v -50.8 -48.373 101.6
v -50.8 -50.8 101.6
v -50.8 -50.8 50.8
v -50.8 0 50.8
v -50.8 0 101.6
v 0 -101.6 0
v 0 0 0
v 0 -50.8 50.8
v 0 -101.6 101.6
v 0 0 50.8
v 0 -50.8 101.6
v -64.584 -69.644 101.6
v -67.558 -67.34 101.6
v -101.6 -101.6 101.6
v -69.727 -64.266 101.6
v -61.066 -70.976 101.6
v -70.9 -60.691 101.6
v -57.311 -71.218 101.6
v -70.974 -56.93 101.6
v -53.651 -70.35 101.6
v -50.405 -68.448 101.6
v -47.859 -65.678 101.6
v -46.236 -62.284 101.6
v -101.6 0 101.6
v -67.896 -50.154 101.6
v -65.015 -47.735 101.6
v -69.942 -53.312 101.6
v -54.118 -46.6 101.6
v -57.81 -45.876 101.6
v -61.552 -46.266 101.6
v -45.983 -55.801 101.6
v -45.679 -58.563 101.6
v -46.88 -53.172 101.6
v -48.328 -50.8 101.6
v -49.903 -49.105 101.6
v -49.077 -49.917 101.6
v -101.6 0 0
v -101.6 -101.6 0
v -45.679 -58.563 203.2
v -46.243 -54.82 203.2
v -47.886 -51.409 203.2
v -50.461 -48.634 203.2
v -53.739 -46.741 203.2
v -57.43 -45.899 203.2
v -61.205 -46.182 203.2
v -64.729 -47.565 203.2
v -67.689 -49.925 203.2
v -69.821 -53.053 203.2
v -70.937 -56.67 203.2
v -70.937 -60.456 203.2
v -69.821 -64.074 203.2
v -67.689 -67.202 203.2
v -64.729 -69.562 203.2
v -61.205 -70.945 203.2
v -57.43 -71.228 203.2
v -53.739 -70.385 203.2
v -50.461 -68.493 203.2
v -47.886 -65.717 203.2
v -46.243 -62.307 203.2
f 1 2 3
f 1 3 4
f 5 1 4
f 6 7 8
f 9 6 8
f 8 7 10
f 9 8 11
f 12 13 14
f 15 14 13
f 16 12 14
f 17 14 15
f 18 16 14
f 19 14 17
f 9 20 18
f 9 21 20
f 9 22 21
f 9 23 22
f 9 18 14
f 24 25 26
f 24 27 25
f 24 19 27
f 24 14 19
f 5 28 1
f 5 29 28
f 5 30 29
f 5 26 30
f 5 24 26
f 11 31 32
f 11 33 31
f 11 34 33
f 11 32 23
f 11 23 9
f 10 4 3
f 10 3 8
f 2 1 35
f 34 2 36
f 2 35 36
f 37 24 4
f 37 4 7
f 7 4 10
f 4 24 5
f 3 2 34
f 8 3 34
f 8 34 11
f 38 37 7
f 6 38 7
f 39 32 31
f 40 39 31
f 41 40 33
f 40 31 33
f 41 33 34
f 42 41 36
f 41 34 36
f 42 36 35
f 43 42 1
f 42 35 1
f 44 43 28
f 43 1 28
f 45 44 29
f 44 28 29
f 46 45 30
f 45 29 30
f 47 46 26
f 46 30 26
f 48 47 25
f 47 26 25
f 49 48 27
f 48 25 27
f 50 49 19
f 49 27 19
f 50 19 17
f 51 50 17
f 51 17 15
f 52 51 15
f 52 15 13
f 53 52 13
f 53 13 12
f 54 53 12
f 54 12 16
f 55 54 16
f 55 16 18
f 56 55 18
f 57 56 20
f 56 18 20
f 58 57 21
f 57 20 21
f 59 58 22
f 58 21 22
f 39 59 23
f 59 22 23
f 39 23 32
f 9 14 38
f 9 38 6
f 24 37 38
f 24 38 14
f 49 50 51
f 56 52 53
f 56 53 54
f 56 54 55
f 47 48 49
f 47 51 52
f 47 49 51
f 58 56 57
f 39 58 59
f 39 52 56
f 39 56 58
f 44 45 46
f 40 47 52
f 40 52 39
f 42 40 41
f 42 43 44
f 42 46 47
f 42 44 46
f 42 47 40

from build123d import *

# Parameters (mm, degrees)
F0_W     = 101.6
F0_H     = 101.6
F1_DEPTH = 101.6
F2_R     = 12.7
F3_DEPTH = 101.6
F4_W     = 50.8
F4_H     = 50.8
F5_DEPTH = 50.8


with BuildPart() as f1:
    # F0 (on Front) → F1 (new body)
    with BuildSketch(Plane.XZ):
        with Locations((-50.8, 50.8)):
            Rectangle(F0_W, F0_H)
    extrude(amount=F1_DEPTH)

    # F2 (on face) → F3 (join)
    with BuildSketch(Plane.XY.offset(101.6)):
        with Locations((-58.379106, -58.563333)):
            Circle(F2_R)
    extrude(amount=F3_DEPTH)

    # F4 (on face) → F5 (cut)
    with BuildSketch(Plane.XY.offset(101.6)):
        with Locations((-25.4, -25.4)):
            Rectangle(F4_W, F4_H)
    extrude(amount=-F5_DEPTH, mode=Mode.SUBTRACT)


solid = f1.part
